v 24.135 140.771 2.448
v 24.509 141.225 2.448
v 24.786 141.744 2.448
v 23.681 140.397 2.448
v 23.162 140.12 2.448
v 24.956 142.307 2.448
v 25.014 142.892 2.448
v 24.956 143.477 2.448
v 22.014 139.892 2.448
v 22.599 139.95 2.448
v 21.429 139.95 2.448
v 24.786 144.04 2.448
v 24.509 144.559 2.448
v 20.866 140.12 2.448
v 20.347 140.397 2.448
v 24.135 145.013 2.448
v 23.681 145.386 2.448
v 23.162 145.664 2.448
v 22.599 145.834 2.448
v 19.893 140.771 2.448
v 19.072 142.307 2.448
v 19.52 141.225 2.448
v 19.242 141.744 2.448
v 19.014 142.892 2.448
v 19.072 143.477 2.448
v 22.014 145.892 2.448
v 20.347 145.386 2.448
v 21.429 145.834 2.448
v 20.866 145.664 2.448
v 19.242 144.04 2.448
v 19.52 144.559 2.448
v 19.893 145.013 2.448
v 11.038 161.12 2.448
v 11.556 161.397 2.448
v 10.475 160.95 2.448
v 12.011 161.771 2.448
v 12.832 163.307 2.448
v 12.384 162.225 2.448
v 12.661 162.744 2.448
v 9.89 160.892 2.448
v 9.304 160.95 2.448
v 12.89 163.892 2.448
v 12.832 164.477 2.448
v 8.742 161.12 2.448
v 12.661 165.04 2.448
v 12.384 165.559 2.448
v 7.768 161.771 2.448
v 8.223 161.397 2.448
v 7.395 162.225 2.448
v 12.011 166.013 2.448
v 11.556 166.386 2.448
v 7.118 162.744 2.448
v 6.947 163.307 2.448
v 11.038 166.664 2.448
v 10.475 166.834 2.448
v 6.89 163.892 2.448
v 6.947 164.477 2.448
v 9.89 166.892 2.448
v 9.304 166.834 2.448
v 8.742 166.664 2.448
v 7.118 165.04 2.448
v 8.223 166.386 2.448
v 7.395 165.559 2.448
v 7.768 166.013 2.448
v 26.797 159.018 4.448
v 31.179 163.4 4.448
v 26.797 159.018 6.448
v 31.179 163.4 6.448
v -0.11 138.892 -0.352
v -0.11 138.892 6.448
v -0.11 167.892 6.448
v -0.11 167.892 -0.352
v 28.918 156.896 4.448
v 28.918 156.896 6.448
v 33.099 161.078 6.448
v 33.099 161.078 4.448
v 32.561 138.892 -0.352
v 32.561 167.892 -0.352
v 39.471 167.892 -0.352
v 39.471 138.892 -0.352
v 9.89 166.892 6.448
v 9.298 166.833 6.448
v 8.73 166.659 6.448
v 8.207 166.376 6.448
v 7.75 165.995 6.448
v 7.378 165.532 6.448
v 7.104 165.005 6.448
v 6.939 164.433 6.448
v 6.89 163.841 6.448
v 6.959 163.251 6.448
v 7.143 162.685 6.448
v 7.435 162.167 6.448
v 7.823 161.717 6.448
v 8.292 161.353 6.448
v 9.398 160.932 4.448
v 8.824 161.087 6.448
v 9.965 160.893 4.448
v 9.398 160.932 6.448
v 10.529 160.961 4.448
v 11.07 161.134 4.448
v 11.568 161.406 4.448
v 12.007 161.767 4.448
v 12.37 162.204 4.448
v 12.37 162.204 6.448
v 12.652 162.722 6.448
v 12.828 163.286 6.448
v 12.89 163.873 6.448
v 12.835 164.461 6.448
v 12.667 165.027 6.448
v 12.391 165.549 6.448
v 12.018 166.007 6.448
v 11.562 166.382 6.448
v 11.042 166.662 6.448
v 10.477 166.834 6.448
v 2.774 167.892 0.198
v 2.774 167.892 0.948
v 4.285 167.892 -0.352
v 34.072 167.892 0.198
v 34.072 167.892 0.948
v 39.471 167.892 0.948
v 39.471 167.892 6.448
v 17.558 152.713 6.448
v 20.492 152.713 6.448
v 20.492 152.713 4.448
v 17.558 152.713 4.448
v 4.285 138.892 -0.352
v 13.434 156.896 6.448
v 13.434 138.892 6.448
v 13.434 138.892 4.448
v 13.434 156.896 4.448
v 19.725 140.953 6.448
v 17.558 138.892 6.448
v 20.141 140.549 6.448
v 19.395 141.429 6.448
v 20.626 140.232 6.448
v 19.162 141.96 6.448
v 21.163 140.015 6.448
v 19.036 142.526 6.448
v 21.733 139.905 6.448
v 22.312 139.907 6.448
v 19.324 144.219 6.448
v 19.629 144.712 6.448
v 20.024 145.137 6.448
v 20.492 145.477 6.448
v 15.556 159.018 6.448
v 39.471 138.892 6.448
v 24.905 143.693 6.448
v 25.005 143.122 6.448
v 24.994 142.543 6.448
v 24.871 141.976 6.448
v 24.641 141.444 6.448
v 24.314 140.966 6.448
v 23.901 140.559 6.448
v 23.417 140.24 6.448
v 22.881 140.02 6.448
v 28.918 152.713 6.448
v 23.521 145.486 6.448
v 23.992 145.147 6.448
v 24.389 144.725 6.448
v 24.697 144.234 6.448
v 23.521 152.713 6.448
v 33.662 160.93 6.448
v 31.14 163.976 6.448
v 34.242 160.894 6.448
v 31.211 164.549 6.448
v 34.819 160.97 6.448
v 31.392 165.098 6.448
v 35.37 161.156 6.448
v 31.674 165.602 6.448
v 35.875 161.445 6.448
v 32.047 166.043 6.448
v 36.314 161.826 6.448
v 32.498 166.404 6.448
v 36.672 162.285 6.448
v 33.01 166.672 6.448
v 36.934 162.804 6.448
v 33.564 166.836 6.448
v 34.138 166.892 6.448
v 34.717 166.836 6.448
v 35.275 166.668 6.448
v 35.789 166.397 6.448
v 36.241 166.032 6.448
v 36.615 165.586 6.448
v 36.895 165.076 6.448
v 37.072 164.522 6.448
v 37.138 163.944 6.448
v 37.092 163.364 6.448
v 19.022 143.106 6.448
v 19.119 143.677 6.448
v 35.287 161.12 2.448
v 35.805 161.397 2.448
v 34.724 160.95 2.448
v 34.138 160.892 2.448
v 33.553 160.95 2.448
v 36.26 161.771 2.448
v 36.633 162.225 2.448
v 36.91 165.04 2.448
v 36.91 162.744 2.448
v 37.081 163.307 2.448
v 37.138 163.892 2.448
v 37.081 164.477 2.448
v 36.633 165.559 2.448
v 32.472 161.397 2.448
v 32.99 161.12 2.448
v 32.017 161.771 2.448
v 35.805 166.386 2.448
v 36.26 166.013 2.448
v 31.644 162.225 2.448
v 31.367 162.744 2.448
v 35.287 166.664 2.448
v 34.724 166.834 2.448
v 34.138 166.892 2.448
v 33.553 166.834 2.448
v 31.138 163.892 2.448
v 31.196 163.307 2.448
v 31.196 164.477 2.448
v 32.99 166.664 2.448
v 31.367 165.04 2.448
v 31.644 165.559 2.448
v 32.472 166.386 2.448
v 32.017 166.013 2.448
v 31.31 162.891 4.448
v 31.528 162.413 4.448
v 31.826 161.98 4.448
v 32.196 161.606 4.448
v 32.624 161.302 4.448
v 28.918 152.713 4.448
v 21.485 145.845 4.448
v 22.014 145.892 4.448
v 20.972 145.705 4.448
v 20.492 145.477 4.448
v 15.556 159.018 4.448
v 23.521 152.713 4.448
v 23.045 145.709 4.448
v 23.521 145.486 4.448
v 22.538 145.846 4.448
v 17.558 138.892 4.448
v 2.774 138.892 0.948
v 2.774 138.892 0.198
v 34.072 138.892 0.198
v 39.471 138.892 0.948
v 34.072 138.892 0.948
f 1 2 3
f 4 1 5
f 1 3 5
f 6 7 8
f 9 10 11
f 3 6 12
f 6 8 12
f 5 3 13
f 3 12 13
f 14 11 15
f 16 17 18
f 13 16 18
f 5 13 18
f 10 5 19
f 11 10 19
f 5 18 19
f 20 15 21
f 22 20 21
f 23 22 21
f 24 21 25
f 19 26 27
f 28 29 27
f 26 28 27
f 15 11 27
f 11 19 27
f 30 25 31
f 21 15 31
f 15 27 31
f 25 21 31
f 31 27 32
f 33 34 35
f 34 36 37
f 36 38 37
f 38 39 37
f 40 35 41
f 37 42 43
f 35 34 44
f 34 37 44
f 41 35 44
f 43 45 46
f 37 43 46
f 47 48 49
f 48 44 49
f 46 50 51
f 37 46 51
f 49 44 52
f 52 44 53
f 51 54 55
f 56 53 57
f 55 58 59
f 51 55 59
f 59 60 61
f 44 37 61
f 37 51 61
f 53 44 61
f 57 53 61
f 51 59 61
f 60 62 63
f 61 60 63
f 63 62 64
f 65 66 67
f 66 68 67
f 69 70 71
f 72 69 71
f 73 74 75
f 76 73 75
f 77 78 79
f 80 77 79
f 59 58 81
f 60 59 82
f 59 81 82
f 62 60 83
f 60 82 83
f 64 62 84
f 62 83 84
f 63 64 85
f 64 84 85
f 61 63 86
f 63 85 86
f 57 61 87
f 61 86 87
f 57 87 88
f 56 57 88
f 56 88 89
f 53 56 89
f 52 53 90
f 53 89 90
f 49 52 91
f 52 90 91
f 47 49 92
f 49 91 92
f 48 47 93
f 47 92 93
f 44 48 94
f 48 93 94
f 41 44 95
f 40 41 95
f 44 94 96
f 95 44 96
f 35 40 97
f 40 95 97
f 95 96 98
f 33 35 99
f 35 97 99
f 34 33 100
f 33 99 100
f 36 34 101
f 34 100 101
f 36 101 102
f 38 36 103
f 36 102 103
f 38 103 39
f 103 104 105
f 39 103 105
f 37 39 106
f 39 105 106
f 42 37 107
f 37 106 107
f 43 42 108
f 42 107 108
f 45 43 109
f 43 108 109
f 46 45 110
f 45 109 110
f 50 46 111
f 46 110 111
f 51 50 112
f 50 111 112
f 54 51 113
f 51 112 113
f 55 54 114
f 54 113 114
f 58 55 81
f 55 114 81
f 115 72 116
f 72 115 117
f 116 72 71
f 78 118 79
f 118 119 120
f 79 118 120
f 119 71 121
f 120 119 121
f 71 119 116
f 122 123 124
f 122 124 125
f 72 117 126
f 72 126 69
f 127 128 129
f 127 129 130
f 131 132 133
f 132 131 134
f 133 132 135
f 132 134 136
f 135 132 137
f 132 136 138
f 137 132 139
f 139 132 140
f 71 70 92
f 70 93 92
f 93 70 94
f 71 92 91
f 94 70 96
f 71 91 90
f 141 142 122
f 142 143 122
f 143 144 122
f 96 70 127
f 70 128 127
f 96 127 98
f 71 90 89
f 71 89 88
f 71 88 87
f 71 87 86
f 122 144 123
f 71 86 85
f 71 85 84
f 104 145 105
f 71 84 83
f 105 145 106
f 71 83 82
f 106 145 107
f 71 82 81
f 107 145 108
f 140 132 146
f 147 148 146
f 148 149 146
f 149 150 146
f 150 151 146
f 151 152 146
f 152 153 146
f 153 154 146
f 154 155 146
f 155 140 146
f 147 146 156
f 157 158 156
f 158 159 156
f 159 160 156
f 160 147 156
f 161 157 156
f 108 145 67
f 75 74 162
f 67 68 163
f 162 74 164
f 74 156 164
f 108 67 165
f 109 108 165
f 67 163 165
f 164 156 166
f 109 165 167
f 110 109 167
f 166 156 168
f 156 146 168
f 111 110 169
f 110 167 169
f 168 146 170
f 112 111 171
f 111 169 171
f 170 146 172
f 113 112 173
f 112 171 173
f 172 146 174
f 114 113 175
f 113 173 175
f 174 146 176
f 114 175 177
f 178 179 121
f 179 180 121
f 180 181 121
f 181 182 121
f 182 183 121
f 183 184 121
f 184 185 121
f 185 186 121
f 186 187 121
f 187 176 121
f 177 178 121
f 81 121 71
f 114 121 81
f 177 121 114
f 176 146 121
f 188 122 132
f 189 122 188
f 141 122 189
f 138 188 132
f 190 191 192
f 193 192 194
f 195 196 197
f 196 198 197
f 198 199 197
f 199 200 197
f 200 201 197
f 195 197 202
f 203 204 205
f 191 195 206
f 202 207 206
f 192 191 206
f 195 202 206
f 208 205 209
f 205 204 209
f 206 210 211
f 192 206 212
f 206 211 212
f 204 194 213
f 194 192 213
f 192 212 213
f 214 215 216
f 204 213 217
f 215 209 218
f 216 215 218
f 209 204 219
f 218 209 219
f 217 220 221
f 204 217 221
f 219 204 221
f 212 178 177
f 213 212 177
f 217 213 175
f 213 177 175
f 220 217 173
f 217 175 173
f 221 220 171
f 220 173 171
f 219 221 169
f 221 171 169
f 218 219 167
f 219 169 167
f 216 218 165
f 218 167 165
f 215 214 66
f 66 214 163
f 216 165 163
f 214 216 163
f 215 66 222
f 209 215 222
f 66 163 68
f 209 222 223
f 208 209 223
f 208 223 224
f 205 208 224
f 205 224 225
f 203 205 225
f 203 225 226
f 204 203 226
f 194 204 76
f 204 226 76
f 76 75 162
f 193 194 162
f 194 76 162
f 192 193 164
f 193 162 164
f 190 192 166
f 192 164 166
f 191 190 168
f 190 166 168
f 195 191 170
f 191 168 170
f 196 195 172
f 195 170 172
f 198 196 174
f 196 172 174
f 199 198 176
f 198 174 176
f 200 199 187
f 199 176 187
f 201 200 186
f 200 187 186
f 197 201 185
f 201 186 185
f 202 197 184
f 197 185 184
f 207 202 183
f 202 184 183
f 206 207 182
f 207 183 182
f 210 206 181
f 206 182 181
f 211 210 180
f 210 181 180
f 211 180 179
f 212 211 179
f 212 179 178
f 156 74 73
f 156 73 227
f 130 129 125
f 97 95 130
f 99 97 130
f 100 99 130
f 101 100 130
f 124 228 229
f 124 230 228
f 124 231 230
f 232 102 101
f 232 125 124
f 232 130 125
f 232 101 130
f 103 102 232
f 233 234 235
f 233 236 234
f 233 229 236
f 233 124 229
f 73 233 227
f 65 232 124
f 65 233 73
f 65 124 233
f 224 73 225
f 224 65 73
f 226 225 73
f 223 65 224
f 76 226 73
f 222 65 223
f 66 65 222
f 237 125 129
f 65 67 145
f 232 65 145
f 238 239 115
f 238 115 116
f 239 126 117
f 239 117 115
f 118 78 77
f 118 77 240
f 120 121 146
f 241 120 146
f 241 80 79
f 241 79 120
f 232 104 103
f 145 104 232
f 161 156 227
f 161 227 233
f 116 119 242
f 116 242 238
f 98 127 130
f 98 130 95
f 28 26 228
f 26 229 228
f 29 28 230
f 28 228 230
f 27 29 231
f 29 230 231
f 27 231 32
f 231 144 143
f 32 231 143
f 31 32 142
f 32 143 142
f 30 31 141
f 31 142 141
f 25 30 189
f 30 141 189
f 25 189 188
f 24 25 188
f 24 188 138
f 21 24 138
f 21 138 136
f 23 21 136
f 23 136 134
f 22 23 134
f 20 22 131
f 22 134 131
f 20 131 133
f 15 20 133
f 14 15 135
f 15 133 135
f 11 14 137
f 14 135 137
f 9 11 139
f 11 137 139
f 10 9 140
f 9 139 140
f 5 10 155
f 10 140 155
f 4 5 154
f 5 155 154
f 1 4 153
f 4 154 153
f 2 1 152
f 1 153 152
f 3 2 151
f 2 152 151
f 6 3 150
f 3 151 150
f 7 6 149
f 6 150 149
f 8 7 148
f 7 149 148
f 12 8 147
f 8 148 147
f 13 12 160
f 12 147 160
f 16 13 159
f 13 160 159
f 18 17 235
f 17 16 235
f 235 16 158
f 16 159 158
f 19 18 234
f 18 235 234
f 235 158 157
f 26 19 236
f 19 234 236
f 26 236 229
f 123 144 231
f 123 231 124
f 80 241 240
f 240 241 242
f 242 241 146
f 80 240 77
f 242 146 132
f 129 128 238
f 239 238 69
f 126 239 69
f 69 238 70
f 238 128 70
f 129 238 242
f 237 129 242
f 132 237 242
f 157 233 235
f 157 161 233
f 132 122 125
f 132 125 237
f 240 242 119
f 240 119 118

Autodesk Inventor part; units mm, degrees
ref_plane "YZ Plane" through (0, 0, 0) normal (1, 0, 0) x (0, 1, 0)
ref_plane "XZ Plane" through (0, 0, 0) normal (0, 1, 0) x (-1, 0, 0)
ref_plane "XY Plane" through (0, 0, 0) normal (0, 0, 1) x (1, 0, 0)
ref_plane "Work Plane1" through (52.5141, 202.7033, 6.4479) normal (0, 0, -1) x (0, 1, 0)
sketch "Sketch1" plane through (52.5141, 202.7033, 6.4479) normal (0, 0, -1) x (0, 1, 0)
  circle A0 centre (-59.8114, -30.5) radius 1.4 construction
  circle A1 centre (-38.8114, -18.3756) radius 1.4 projected
  circle A2 centre (-38.8114, -42.6244) radius 1.4 construction
  circle A3 centre (41, 0) radius 1.65 projected
  circle A4 centre (-9, 0) radius 1.65 projected
  circle A5 centre (-9, 50) radius 1.65 projected
  circle A6 centre (41, 50) radius 1.65 projected
  circle A7 centre (16, 50) radius 1.65 projected
  circle A8 centre (-9, 25) radius 1.65 projected
  circle A9 centre (16, 0) radius 1.65 projected
  circle A10 centre (41, 25) radius 1.65 projected
  line L0 (80, 55) -> (-80, 55) projected
  line L1 (-80, 55) -> (-80, -55) projected
  line L2 (-80, -55) -> (80, -55) projected
  line L3 (80, -55) -> (80, 55) projected
  line L4 (-36.5, 0) -> (-36.5, -50) projected
  line L5 (-14, 0) -> (-36.5, 0) projected
  line L6 (-14, -5) -> (-14, 0) projected
  line L7 (72, -5) -> (-14, -5) projected
  line L8 (72, -50) -> (72, -5) projected
  line L9 (-36.5, -50) -> (72, -50) projected
  line L10 (-4, 45) -> (-4, 5) projected
  line L11 (36, 45) -> (-4, 45) projected
  line L12 (36, 5) -> (36, 45) projected
  line L13 (-4, 5) -> (36, 5) projected
  line L14 (-64.5989, -17.0433) -> (-64.5989, -57.0433) construction
  line L15 (-64.5989, -57.0433) -> (-34.5989, -57.0433) construction
  line L16 (-34.5989, -57.0433) -> (-34.5989, -17.0433) construction
  line L17 (-34.5989, -17.0433) -> (-64.5989, -17.0433) construction
  line L18 (-34.8114, -13.0433) -> (-63.8114, -13.0433)
  line L19 (-63.8114, -13.0433) -> (-63.8114, -52.6244)
  line L20 (-63.8114, -52.6244) -> (-34.8114, -52.6244)
  line L21 (-34.8114, -52.6244) -> (-34.8114, -13.0433)
  circle A11 centre (-59.8114, -30.5) radius 3
  circle A12 centre (-38.8114, -18.3756) radius 3
  circle A13 centre (-38.8114, -42.6244) radius 3 construction
  line L22 (-36.5, -35.1157) -> (-41.75, -35.1157) construction
  line L23 (-41.75, -35.1157) -> (-41.75, -38.5657) construction
  line L24 (-41.75, -38.5657) -> (-56.86, -38.5657) construction
  line L25 (-56.86, -38.5657) -> (-56.86, -35.1157) construction
  line L26 (-56.86, -35.1157) -> (-60.26, -35.1157) construction
  line L27 (-60.26, -35.1157) -> (-60.26, -52.0657) construction
  line L28 (-60.26, -52.0657) -> (-36.5, -52.0657) construction
  line L29 (-36.5, -52.0657) -> (-36.5, -35.1157) construction
  line L30 (-41.75, -28.3657) -> (-36.5, -28.3657) construction
  line L31 (-36.5, -28.3657) -> (-36.5, -25.0657) construction
  line L32 (-36.5, -25.0657) -> (-60.26, -25.0657) construction
  line L33 (-60.26, -25.0657) -> (-60.26, -28.3657) construction
  line L34 (-60.26, -28.3657) -> (-56.86, -28.3657) construction
  line L35 (-56.86, -28.3657) -> (-56.86, -27.0942) construction
  line L36 (-56.86, -27.0942) -> (-41.75, -27.0942) construction
  line L37 (-41.75, -27.0942) -> (-41.75, -28.3657) construction
  line L38 (-56.86, -35.1157) -> (-60.26, -35.1157) construction
  line L39 (-56.86, -38.5657) -> (-56.86, -35.1157) construction
  line L40 (-41.75, -38.5657) -> (-56.86, -38.5657) construction
  line L41 (-41.75, -35.1157) -> (-41.75, -38.5657) construction
  line L42 (-36.5, -35.1157) -> (-41.75, -35.1157) construction
  line L43 (-36.5, -35.05) -> (-36.5, -35.1157) construction
  line L44 (-36.5, -35.05) -> (-56.86, -35.05) construction
  line L45 (-36.5, -34.78) -> (-36.5, -35.05) construction
  line L46 (-36.5, -34.78) -> (-56.86, -34.78) construction
  line L47 (-36.5, -34.51) -> (-36.5, -34.78) construction
  line L48 (-36.5, -34.51) -> (-56.86, -34.51) construction
  line L49 (-36.5, -34.24) -> (-36.5, -34.51) construction
  line L50 (-36.5, -34.24) -> (-56.86, -34.24) construction
  line L51 (-36.5, -33.97) -> (-36.5, -34.24) construction
  line L52 (-36.5, -33.97) -> (-56.86, -33.97) construction
  line L53 (-36.5, -33.7) -> (-36.5, -33.97) construction
  line L54 (-36.5, -33.7) -> (-56.86, -33.7) construction
  line L55 (-36.5, -33.43) -> (-36.5, -33.7) construction
  line L56 (-36.5, -33.43) -> (-56.86, -33.43) construction
  line L57 (-36.5, -33.16) -> (-36.5, -33.43) construction
  line L58 (-36.5, -33.16) -> (-56.86, -33.16) construction
  line L59 (-36.5, -32.89) -> (-36.5, -33.16) construction
  line L60 (-36.5, -32.89) -> (-56.86, -32.89) construction
  line L61 (-36.5, -32.62) -> (-36.5, -32.89) construction
  line L62 (-36.5, -32.62) -> (-56.86, -32.62) construction
  line L63 (-36.5, -32.35) -> (-36.5, -32.62) construction
  line L64 (-36.5, -32.35) -> (-56.86, -32.35) construction
  line L65 (-36.5, -32.08) -> (-36.5, -32.35) construction
  line L66 (-36.5, -32.08) -> (-56.86, -32.08) construction
  line L67 (-36.5, -31.81) -> (-36.5, -32.08) construction
  line L68 (-36.5, -31.81) -> (-56.86, -31.81) construction
  line L69 (-36.5, -31.54) -> (-36.5, -31.81) construction
  line L70 (-36.5, -31.54) -> (-56.86, -31.54) construction
  line L71 (-36.5, -31.27) -> (-36.5, -31.54) construction
  line L72 (-36.5, -31.27) -> (-56.86, -31.27) construction
  line L73 (-36.5, -31) -> (-36.5, -31.27) construction
  line L74 (-36.5, -31) -> (-56.86, -31) construction
  line L75 (-36.5, -30.73) -> (-36.5, -31) construction
  line L76 (-36.5, -30.73) -> (-56.86, -30.73) construction
  line L77 (-36.5, -30.46) -> (-36.5, -30.73) construction
  line L78 (-36.5, -30.46) -> (-56.86, -30.46) construction
  line L79 (-36.5, -30.19) -> (-36.5, -30.46) construction
  line L80 (-36.5, -30.19) -> (-56.86, -30.19) construction
  line L81 (-36.5, -29.92) -> (-36.5, -30.19) construction
  line L82 (-36.5, -29.92) -> (-56.86, -29.92) construction
  line L83 (-36.5, -29.65) -> (-36.5, -29.92) construction
  line L84 (-36.5, -29.65) -> (-56.86, -29.65) construction
  line L85 (-36.5, -29.38) -> (-36.5, -29.65) construction
  line L86 (-36.5, -29.38) -> (-56.86, -29.38) construction
  line L87 (-36.5, -29.11) -> (-36.5, -29.38) construction
  line L88 (-36.5, -29.11) -> (-56.86, -29.11) construction
  line L89 (-36.5, -28.84) -> (-36.5, -29.11) construction
  line L90 (-36.5, -28.84) -> (-56.86, -28.84) construction
  line L91 (-36.5, -28.3657) -> (-36.5, -28.84) construction
  line L92 (-41.75, -28.3657) -> (-36.5, -28.3657) construction
  line L93 (-41.75, -27.0942) -> (-41.75, -28.3657) construction
  line L94 (-56.86, -27.0942) -> (-41.75, -27.0942) construction
  line L95 (-56.86, -28.3657) -> (-56.86, -27.0942) construction
  line L96 (-60.26, -28.3657) -> (-56.86, -28.3657) construction
  line L97 (-60.26, -35.1157) -> (-60.26, -28.3657) construction
  line L98 (-60.26, -25.0657) -> (-36.5, -25.0657) construction
  line L99 (-36.5, -25.0657) -> (-36.5, -52.0657) construction
  line L100 (-60.26, -52.0657) -> (-60.26, -25.0657) construction
  line L101 (-57.1632, -22.5233) -> (-33.4032, -22.5233) construction
  line L102 (-33.4032, -22.5233) -> (-33.4032, -49.5233) construction
  line L103 (-33.4032, -49.5233) -> (-57.1632, -49.5233) construction
  line L104 (-57.1632, -49.5233) -> (-57.1632, -22.5233) construction
  circle A14 centre (-38.8114, -42.6244) radius 3
  point P0 (-202.7033, -52.5141)
  point P1 (-56.7146, -27.9576)
  dimension "d0" = 4
  dimension "d2" = 4
  dimension "d3" = 4
  dimension "d4" = 6
  dimension "d5" = 6
  dimension "d6" = 6
  dimension "d10" = 10
extrude "Extrusion1" add sketch "Sketch1" along normal blind 4 contours L18 L21 L9 L4 A14 A12 | L4 A12 A14 L9 L21 L20 L19 L18
sketch "Sketch2" plane through (52.5141, 202.7033, 2.4479) normal (0, 0, -1) x (-1, 0, 0)
  circle A0 centre (42.6244, -38.8114) radius 3 projected
  circle A1 centre (18.3756, -38.8114) radius 3 projected
  circle A2 centre (30.5, -59.8114) radius 3 projected
  line L0 (13.0433, -34.8114) -> (13.0433, -63.8114) projected
  line L1 (13.0433, -63.8114) -> (52.6244, -63.8114) projected
  line L2 (52.6244, -63.8114) -> (52.6244, -34.8114) projected
  line L3 (52.6244, -34.8114) -> (13.0433, -34.8114) projected
  point P0 (52.5141, -202.7033)
extrude "Extrusion2" add sketch "Sketch2" along normal blind 1.5 contours A0 | A1 | A2 | L3 L2 L1 L0
sketch "Sketch3" plane through (-0.1103, 138.8919, 6.4479) normal (0, -1, 0) x (1, 0, 0)
  line L0 (39.581, 0) -> (0, 0) construction
  line L1 (0, 0) -> (0, -5.5) construction
  line L2 (39.581, -5.5) -> (0, -5.5) projected
  line L3 (39.581, 0) -> (39.581, -5.5) projected
  line L4 (17.5087, -7.4479) -> (17.5087, -6.8479) construction
  line L5 (17.5087, -6.8479) -> (24.2587, -6.8479) construction
  line L6 (24.2587, -6.8479) -> (24.2587, -7.4479) construction
  line L7 (27.5587, -7.4479) -> (24.2587, -7.4479) construction
  line L8 (27.5587, -6.4479) -> (27.5587, -7.4479) construction
  line L9 (27.5587, -6.4479) -> (0.5587, -6.4479) construction
  line L10 (0.5587, -6.4479) -> (0.5587, -7.4479) construction
  line L11 (17.5087, -7.4479) -> (0.5587, -7.4479) construction
  line L12 (39.581, 0) -> (39.581, -5.5) construction
  line L13 (39.581, -5.5) -> (34.1825, -5.5)
  line L14 (34.1825, -5.5) -> (34.1825, -6.25)
  line L15 (34.8694, -6.8) -> (39.581, -6.8)
  line L16 (39.581, -6.8) -> (39.581, -5.5)
  line L17 (39.581, -6.8) -> (32.6714, -6.8)
  line L18 (32.6714, -6.8) -> (34.1825, -6.25)
  line L19 (12.6726, -5.5) -> (12.6726, -6.5) projected
  line L20 (0, 0) -> (0, -5.5) construction
  line L21 (0, -5.5) -> (2.8846, -5.5)
  line L22 (4.3957, -6.8) -> (0, -6.8)
  line L23 (0, -6.8) -> (0, -5.5)
  line L24 (4.3957, -6.8) -> (4.3957, -6.8)
  line L25 (0, -5.5) -> (39.581, -5.5) projected
  line L26 (4.3957, -6.8) -> (2.8846, -6.25)
  line L27 (2.8846, -6.25) -> (2.8846, -5.5)
  line L28 (3.4957, -5.5) -> (33.4957, -5.5) construction
  line L29 (33.4957, -5.5) -> (33.4957, -6.5) construction
  line L30 (33.4957, -6.5) -> (3.4957, -6.5) construction
  line L31 (3.4957, -6.5) -> (3.4957, -5.5) construction
  point P0 (8.981, -5.5)
  dimension "d42" = 1.3
  dimension "d43" = 110
  dimension "d45" = 0.75
  dimension "h1" = 0.75
  dimension "d47" = 110
  dimension "d48" = 30
  dimension "d49" = 1
  dimension "d50" = 0.9
  dimension "d51" = 0
extrude "Extrusion3" add sketch "Sketch3" against normal up to surface (29 mm away)
sketch "Sketch6" plane through (52.5141, 202.7033, 6.4479) normal (0, 0, 1) x (1, 0, 0)
  line L0 (-13.0433, -34.8114) -> (-13.0433, -63.8114) projected
  line L1 (-52.6244, -34.8114) -> (-13.0433, -34.8114) projected
  line L2 (-52.6244, -63.8114) -> (-52.6244, -34.8114) projected
  line L3 (-13.0433, -63.8114) -> (-52.6244, -63.8114) projected
  line L4 (-23.5962, -45.8071) -> (-17.5454, -39.7563)
  line L5 (-17.5454, -39.7563) -> (-19.6668, -37.635)
  line L6 (-19.6668, -37.635) -> (-25.7175, -43.6858)
  line L7 (-25.7175, -43.6858) -> (-23.5962, -45.8071)
  line L8 (-23.5962, -45.8071) -> (-19.6668, -37.635) construction
  line L9 (-17.5454, -39.7563) -> (-25.7175, -43.6858) construction
  line L10 (-39.0797, -45.8071) -> (-43.9064, -40.9803)
  line L11 (-43.9064, -40.9803) -> (-41.7851, -38.859)
  line L12 (-41.7851, -38.859) -> (-36.9583, -43.6858)
  line L13 (-36.9583, -43.6858) -> (-39.0797, -45.8071)
  line L14 (-39.0797, -45.8071) -> (-41.7851, -38.859) construction
  line L15 (-43.9064, -40.9803) -> (-36.9583, -43.6858) construction
  line L16 (-25.7175, -43.6858) -> (-36.9583, -43.6858)
  line L17 (-23.5962, -45.8071) -> (-23.5962, -49.9899)
  line L18 (-23.5962, -49.9899) -> (-39.0797, -49.9899)
  line L19 (-39.0797, -49.9899) -> (-39.0797, -45.8071)
  line L20 (-32.0216, -49.9899) -> (-28.9927, -49.9899)
  line L21 (-28.9927, -49.9899) -> (-28.9927, -57.6065)
  line L22 (-28.9927, -57.6065) -> (-32.0216, -57.6065)
  line L23 (-32.0216, -57.6065) -> (-32.0216, -49.9899)
  line L24 (-39.0797, -45.8071) -> (-39.0797, -49.9899)
  line L25 (-48.2287, -63.8114) -> (-48.2287, -34.8114) construction
  line L26 (-39.0797, -49.9899) -> (-34.9564, -49.9899)
  line L27 (-34.9564, -49.9899) -> (-34.9564, -63.8114)
  line L28 (-34.9564, -63.8114) -> (-39.0797, -63.8114)
  line L29 (-39.0797, -63.8114) -> (-39.0797, -49.9899)
  point P0 (-52.5141, -202.7033)
  point P1 (-21.6315, -41.7211)
  point P2 (-40.4324, -42.333)
  dimension "d35" = 3
  dimension "d36" = 3
  dimension "d37" = 45
  dimension "d38" = 0
extrude "Extrusion6" cut sketch "Sketch6" against normal blind 2 contours L3 L29 L18 L27 | L18 L19 L13 L16 L7 L17 | L18 L21 L22 L23 | L10 L11 L12 L13 | L6 L5 L4 L7
sketch "Sketch7" plane through (-0.1103, 138.8919, 6.4479) normal (0, -1, 0) x (0, 0, 1)
  line L0 (-11.273, -20.7778) -> (-5.5, -20.7778)
  line L1 (-5.5, -20.7778) -> (-5.5, -10.7778)
  line L2 (-5.5, -10.7778) -> (-11.273, -10.7778)
  line L3 (-11.273, -10.7778) -> (-11.273, -20.7778)
  line L4 (-5.5, -34.1825) -> (-5.5, -2.8846) projected
  point P0 (-6.8, -32.6714)
  dimension "d53" = 10
extrude "Extrusion7" [suppressed]
fillet "Fillet1" [suppressed]
sketch "Sketch8" plane through (-0.1103, 138.8919, 6.4479) normal (0, -1, 0) x (0, 0, 1)
  line L0 (0, 0) -> (-6.8, 0) projected
  line L1 (0, 0) -> (-6.8, 0) projected
  circle A0 centre (-7.6471, -15.7336) radius 2.6
  line L2 (-6.8, 0) -> (-6.8, 0) projected
  point P0 (-6.4479, -0.1103)
  dimension "d58" = 5.2
extrude "Extrusion8" [suppressed]
equation "\"d45\" = h1"
properties part number "cellSTORM_v5_chiptray_old_0"
